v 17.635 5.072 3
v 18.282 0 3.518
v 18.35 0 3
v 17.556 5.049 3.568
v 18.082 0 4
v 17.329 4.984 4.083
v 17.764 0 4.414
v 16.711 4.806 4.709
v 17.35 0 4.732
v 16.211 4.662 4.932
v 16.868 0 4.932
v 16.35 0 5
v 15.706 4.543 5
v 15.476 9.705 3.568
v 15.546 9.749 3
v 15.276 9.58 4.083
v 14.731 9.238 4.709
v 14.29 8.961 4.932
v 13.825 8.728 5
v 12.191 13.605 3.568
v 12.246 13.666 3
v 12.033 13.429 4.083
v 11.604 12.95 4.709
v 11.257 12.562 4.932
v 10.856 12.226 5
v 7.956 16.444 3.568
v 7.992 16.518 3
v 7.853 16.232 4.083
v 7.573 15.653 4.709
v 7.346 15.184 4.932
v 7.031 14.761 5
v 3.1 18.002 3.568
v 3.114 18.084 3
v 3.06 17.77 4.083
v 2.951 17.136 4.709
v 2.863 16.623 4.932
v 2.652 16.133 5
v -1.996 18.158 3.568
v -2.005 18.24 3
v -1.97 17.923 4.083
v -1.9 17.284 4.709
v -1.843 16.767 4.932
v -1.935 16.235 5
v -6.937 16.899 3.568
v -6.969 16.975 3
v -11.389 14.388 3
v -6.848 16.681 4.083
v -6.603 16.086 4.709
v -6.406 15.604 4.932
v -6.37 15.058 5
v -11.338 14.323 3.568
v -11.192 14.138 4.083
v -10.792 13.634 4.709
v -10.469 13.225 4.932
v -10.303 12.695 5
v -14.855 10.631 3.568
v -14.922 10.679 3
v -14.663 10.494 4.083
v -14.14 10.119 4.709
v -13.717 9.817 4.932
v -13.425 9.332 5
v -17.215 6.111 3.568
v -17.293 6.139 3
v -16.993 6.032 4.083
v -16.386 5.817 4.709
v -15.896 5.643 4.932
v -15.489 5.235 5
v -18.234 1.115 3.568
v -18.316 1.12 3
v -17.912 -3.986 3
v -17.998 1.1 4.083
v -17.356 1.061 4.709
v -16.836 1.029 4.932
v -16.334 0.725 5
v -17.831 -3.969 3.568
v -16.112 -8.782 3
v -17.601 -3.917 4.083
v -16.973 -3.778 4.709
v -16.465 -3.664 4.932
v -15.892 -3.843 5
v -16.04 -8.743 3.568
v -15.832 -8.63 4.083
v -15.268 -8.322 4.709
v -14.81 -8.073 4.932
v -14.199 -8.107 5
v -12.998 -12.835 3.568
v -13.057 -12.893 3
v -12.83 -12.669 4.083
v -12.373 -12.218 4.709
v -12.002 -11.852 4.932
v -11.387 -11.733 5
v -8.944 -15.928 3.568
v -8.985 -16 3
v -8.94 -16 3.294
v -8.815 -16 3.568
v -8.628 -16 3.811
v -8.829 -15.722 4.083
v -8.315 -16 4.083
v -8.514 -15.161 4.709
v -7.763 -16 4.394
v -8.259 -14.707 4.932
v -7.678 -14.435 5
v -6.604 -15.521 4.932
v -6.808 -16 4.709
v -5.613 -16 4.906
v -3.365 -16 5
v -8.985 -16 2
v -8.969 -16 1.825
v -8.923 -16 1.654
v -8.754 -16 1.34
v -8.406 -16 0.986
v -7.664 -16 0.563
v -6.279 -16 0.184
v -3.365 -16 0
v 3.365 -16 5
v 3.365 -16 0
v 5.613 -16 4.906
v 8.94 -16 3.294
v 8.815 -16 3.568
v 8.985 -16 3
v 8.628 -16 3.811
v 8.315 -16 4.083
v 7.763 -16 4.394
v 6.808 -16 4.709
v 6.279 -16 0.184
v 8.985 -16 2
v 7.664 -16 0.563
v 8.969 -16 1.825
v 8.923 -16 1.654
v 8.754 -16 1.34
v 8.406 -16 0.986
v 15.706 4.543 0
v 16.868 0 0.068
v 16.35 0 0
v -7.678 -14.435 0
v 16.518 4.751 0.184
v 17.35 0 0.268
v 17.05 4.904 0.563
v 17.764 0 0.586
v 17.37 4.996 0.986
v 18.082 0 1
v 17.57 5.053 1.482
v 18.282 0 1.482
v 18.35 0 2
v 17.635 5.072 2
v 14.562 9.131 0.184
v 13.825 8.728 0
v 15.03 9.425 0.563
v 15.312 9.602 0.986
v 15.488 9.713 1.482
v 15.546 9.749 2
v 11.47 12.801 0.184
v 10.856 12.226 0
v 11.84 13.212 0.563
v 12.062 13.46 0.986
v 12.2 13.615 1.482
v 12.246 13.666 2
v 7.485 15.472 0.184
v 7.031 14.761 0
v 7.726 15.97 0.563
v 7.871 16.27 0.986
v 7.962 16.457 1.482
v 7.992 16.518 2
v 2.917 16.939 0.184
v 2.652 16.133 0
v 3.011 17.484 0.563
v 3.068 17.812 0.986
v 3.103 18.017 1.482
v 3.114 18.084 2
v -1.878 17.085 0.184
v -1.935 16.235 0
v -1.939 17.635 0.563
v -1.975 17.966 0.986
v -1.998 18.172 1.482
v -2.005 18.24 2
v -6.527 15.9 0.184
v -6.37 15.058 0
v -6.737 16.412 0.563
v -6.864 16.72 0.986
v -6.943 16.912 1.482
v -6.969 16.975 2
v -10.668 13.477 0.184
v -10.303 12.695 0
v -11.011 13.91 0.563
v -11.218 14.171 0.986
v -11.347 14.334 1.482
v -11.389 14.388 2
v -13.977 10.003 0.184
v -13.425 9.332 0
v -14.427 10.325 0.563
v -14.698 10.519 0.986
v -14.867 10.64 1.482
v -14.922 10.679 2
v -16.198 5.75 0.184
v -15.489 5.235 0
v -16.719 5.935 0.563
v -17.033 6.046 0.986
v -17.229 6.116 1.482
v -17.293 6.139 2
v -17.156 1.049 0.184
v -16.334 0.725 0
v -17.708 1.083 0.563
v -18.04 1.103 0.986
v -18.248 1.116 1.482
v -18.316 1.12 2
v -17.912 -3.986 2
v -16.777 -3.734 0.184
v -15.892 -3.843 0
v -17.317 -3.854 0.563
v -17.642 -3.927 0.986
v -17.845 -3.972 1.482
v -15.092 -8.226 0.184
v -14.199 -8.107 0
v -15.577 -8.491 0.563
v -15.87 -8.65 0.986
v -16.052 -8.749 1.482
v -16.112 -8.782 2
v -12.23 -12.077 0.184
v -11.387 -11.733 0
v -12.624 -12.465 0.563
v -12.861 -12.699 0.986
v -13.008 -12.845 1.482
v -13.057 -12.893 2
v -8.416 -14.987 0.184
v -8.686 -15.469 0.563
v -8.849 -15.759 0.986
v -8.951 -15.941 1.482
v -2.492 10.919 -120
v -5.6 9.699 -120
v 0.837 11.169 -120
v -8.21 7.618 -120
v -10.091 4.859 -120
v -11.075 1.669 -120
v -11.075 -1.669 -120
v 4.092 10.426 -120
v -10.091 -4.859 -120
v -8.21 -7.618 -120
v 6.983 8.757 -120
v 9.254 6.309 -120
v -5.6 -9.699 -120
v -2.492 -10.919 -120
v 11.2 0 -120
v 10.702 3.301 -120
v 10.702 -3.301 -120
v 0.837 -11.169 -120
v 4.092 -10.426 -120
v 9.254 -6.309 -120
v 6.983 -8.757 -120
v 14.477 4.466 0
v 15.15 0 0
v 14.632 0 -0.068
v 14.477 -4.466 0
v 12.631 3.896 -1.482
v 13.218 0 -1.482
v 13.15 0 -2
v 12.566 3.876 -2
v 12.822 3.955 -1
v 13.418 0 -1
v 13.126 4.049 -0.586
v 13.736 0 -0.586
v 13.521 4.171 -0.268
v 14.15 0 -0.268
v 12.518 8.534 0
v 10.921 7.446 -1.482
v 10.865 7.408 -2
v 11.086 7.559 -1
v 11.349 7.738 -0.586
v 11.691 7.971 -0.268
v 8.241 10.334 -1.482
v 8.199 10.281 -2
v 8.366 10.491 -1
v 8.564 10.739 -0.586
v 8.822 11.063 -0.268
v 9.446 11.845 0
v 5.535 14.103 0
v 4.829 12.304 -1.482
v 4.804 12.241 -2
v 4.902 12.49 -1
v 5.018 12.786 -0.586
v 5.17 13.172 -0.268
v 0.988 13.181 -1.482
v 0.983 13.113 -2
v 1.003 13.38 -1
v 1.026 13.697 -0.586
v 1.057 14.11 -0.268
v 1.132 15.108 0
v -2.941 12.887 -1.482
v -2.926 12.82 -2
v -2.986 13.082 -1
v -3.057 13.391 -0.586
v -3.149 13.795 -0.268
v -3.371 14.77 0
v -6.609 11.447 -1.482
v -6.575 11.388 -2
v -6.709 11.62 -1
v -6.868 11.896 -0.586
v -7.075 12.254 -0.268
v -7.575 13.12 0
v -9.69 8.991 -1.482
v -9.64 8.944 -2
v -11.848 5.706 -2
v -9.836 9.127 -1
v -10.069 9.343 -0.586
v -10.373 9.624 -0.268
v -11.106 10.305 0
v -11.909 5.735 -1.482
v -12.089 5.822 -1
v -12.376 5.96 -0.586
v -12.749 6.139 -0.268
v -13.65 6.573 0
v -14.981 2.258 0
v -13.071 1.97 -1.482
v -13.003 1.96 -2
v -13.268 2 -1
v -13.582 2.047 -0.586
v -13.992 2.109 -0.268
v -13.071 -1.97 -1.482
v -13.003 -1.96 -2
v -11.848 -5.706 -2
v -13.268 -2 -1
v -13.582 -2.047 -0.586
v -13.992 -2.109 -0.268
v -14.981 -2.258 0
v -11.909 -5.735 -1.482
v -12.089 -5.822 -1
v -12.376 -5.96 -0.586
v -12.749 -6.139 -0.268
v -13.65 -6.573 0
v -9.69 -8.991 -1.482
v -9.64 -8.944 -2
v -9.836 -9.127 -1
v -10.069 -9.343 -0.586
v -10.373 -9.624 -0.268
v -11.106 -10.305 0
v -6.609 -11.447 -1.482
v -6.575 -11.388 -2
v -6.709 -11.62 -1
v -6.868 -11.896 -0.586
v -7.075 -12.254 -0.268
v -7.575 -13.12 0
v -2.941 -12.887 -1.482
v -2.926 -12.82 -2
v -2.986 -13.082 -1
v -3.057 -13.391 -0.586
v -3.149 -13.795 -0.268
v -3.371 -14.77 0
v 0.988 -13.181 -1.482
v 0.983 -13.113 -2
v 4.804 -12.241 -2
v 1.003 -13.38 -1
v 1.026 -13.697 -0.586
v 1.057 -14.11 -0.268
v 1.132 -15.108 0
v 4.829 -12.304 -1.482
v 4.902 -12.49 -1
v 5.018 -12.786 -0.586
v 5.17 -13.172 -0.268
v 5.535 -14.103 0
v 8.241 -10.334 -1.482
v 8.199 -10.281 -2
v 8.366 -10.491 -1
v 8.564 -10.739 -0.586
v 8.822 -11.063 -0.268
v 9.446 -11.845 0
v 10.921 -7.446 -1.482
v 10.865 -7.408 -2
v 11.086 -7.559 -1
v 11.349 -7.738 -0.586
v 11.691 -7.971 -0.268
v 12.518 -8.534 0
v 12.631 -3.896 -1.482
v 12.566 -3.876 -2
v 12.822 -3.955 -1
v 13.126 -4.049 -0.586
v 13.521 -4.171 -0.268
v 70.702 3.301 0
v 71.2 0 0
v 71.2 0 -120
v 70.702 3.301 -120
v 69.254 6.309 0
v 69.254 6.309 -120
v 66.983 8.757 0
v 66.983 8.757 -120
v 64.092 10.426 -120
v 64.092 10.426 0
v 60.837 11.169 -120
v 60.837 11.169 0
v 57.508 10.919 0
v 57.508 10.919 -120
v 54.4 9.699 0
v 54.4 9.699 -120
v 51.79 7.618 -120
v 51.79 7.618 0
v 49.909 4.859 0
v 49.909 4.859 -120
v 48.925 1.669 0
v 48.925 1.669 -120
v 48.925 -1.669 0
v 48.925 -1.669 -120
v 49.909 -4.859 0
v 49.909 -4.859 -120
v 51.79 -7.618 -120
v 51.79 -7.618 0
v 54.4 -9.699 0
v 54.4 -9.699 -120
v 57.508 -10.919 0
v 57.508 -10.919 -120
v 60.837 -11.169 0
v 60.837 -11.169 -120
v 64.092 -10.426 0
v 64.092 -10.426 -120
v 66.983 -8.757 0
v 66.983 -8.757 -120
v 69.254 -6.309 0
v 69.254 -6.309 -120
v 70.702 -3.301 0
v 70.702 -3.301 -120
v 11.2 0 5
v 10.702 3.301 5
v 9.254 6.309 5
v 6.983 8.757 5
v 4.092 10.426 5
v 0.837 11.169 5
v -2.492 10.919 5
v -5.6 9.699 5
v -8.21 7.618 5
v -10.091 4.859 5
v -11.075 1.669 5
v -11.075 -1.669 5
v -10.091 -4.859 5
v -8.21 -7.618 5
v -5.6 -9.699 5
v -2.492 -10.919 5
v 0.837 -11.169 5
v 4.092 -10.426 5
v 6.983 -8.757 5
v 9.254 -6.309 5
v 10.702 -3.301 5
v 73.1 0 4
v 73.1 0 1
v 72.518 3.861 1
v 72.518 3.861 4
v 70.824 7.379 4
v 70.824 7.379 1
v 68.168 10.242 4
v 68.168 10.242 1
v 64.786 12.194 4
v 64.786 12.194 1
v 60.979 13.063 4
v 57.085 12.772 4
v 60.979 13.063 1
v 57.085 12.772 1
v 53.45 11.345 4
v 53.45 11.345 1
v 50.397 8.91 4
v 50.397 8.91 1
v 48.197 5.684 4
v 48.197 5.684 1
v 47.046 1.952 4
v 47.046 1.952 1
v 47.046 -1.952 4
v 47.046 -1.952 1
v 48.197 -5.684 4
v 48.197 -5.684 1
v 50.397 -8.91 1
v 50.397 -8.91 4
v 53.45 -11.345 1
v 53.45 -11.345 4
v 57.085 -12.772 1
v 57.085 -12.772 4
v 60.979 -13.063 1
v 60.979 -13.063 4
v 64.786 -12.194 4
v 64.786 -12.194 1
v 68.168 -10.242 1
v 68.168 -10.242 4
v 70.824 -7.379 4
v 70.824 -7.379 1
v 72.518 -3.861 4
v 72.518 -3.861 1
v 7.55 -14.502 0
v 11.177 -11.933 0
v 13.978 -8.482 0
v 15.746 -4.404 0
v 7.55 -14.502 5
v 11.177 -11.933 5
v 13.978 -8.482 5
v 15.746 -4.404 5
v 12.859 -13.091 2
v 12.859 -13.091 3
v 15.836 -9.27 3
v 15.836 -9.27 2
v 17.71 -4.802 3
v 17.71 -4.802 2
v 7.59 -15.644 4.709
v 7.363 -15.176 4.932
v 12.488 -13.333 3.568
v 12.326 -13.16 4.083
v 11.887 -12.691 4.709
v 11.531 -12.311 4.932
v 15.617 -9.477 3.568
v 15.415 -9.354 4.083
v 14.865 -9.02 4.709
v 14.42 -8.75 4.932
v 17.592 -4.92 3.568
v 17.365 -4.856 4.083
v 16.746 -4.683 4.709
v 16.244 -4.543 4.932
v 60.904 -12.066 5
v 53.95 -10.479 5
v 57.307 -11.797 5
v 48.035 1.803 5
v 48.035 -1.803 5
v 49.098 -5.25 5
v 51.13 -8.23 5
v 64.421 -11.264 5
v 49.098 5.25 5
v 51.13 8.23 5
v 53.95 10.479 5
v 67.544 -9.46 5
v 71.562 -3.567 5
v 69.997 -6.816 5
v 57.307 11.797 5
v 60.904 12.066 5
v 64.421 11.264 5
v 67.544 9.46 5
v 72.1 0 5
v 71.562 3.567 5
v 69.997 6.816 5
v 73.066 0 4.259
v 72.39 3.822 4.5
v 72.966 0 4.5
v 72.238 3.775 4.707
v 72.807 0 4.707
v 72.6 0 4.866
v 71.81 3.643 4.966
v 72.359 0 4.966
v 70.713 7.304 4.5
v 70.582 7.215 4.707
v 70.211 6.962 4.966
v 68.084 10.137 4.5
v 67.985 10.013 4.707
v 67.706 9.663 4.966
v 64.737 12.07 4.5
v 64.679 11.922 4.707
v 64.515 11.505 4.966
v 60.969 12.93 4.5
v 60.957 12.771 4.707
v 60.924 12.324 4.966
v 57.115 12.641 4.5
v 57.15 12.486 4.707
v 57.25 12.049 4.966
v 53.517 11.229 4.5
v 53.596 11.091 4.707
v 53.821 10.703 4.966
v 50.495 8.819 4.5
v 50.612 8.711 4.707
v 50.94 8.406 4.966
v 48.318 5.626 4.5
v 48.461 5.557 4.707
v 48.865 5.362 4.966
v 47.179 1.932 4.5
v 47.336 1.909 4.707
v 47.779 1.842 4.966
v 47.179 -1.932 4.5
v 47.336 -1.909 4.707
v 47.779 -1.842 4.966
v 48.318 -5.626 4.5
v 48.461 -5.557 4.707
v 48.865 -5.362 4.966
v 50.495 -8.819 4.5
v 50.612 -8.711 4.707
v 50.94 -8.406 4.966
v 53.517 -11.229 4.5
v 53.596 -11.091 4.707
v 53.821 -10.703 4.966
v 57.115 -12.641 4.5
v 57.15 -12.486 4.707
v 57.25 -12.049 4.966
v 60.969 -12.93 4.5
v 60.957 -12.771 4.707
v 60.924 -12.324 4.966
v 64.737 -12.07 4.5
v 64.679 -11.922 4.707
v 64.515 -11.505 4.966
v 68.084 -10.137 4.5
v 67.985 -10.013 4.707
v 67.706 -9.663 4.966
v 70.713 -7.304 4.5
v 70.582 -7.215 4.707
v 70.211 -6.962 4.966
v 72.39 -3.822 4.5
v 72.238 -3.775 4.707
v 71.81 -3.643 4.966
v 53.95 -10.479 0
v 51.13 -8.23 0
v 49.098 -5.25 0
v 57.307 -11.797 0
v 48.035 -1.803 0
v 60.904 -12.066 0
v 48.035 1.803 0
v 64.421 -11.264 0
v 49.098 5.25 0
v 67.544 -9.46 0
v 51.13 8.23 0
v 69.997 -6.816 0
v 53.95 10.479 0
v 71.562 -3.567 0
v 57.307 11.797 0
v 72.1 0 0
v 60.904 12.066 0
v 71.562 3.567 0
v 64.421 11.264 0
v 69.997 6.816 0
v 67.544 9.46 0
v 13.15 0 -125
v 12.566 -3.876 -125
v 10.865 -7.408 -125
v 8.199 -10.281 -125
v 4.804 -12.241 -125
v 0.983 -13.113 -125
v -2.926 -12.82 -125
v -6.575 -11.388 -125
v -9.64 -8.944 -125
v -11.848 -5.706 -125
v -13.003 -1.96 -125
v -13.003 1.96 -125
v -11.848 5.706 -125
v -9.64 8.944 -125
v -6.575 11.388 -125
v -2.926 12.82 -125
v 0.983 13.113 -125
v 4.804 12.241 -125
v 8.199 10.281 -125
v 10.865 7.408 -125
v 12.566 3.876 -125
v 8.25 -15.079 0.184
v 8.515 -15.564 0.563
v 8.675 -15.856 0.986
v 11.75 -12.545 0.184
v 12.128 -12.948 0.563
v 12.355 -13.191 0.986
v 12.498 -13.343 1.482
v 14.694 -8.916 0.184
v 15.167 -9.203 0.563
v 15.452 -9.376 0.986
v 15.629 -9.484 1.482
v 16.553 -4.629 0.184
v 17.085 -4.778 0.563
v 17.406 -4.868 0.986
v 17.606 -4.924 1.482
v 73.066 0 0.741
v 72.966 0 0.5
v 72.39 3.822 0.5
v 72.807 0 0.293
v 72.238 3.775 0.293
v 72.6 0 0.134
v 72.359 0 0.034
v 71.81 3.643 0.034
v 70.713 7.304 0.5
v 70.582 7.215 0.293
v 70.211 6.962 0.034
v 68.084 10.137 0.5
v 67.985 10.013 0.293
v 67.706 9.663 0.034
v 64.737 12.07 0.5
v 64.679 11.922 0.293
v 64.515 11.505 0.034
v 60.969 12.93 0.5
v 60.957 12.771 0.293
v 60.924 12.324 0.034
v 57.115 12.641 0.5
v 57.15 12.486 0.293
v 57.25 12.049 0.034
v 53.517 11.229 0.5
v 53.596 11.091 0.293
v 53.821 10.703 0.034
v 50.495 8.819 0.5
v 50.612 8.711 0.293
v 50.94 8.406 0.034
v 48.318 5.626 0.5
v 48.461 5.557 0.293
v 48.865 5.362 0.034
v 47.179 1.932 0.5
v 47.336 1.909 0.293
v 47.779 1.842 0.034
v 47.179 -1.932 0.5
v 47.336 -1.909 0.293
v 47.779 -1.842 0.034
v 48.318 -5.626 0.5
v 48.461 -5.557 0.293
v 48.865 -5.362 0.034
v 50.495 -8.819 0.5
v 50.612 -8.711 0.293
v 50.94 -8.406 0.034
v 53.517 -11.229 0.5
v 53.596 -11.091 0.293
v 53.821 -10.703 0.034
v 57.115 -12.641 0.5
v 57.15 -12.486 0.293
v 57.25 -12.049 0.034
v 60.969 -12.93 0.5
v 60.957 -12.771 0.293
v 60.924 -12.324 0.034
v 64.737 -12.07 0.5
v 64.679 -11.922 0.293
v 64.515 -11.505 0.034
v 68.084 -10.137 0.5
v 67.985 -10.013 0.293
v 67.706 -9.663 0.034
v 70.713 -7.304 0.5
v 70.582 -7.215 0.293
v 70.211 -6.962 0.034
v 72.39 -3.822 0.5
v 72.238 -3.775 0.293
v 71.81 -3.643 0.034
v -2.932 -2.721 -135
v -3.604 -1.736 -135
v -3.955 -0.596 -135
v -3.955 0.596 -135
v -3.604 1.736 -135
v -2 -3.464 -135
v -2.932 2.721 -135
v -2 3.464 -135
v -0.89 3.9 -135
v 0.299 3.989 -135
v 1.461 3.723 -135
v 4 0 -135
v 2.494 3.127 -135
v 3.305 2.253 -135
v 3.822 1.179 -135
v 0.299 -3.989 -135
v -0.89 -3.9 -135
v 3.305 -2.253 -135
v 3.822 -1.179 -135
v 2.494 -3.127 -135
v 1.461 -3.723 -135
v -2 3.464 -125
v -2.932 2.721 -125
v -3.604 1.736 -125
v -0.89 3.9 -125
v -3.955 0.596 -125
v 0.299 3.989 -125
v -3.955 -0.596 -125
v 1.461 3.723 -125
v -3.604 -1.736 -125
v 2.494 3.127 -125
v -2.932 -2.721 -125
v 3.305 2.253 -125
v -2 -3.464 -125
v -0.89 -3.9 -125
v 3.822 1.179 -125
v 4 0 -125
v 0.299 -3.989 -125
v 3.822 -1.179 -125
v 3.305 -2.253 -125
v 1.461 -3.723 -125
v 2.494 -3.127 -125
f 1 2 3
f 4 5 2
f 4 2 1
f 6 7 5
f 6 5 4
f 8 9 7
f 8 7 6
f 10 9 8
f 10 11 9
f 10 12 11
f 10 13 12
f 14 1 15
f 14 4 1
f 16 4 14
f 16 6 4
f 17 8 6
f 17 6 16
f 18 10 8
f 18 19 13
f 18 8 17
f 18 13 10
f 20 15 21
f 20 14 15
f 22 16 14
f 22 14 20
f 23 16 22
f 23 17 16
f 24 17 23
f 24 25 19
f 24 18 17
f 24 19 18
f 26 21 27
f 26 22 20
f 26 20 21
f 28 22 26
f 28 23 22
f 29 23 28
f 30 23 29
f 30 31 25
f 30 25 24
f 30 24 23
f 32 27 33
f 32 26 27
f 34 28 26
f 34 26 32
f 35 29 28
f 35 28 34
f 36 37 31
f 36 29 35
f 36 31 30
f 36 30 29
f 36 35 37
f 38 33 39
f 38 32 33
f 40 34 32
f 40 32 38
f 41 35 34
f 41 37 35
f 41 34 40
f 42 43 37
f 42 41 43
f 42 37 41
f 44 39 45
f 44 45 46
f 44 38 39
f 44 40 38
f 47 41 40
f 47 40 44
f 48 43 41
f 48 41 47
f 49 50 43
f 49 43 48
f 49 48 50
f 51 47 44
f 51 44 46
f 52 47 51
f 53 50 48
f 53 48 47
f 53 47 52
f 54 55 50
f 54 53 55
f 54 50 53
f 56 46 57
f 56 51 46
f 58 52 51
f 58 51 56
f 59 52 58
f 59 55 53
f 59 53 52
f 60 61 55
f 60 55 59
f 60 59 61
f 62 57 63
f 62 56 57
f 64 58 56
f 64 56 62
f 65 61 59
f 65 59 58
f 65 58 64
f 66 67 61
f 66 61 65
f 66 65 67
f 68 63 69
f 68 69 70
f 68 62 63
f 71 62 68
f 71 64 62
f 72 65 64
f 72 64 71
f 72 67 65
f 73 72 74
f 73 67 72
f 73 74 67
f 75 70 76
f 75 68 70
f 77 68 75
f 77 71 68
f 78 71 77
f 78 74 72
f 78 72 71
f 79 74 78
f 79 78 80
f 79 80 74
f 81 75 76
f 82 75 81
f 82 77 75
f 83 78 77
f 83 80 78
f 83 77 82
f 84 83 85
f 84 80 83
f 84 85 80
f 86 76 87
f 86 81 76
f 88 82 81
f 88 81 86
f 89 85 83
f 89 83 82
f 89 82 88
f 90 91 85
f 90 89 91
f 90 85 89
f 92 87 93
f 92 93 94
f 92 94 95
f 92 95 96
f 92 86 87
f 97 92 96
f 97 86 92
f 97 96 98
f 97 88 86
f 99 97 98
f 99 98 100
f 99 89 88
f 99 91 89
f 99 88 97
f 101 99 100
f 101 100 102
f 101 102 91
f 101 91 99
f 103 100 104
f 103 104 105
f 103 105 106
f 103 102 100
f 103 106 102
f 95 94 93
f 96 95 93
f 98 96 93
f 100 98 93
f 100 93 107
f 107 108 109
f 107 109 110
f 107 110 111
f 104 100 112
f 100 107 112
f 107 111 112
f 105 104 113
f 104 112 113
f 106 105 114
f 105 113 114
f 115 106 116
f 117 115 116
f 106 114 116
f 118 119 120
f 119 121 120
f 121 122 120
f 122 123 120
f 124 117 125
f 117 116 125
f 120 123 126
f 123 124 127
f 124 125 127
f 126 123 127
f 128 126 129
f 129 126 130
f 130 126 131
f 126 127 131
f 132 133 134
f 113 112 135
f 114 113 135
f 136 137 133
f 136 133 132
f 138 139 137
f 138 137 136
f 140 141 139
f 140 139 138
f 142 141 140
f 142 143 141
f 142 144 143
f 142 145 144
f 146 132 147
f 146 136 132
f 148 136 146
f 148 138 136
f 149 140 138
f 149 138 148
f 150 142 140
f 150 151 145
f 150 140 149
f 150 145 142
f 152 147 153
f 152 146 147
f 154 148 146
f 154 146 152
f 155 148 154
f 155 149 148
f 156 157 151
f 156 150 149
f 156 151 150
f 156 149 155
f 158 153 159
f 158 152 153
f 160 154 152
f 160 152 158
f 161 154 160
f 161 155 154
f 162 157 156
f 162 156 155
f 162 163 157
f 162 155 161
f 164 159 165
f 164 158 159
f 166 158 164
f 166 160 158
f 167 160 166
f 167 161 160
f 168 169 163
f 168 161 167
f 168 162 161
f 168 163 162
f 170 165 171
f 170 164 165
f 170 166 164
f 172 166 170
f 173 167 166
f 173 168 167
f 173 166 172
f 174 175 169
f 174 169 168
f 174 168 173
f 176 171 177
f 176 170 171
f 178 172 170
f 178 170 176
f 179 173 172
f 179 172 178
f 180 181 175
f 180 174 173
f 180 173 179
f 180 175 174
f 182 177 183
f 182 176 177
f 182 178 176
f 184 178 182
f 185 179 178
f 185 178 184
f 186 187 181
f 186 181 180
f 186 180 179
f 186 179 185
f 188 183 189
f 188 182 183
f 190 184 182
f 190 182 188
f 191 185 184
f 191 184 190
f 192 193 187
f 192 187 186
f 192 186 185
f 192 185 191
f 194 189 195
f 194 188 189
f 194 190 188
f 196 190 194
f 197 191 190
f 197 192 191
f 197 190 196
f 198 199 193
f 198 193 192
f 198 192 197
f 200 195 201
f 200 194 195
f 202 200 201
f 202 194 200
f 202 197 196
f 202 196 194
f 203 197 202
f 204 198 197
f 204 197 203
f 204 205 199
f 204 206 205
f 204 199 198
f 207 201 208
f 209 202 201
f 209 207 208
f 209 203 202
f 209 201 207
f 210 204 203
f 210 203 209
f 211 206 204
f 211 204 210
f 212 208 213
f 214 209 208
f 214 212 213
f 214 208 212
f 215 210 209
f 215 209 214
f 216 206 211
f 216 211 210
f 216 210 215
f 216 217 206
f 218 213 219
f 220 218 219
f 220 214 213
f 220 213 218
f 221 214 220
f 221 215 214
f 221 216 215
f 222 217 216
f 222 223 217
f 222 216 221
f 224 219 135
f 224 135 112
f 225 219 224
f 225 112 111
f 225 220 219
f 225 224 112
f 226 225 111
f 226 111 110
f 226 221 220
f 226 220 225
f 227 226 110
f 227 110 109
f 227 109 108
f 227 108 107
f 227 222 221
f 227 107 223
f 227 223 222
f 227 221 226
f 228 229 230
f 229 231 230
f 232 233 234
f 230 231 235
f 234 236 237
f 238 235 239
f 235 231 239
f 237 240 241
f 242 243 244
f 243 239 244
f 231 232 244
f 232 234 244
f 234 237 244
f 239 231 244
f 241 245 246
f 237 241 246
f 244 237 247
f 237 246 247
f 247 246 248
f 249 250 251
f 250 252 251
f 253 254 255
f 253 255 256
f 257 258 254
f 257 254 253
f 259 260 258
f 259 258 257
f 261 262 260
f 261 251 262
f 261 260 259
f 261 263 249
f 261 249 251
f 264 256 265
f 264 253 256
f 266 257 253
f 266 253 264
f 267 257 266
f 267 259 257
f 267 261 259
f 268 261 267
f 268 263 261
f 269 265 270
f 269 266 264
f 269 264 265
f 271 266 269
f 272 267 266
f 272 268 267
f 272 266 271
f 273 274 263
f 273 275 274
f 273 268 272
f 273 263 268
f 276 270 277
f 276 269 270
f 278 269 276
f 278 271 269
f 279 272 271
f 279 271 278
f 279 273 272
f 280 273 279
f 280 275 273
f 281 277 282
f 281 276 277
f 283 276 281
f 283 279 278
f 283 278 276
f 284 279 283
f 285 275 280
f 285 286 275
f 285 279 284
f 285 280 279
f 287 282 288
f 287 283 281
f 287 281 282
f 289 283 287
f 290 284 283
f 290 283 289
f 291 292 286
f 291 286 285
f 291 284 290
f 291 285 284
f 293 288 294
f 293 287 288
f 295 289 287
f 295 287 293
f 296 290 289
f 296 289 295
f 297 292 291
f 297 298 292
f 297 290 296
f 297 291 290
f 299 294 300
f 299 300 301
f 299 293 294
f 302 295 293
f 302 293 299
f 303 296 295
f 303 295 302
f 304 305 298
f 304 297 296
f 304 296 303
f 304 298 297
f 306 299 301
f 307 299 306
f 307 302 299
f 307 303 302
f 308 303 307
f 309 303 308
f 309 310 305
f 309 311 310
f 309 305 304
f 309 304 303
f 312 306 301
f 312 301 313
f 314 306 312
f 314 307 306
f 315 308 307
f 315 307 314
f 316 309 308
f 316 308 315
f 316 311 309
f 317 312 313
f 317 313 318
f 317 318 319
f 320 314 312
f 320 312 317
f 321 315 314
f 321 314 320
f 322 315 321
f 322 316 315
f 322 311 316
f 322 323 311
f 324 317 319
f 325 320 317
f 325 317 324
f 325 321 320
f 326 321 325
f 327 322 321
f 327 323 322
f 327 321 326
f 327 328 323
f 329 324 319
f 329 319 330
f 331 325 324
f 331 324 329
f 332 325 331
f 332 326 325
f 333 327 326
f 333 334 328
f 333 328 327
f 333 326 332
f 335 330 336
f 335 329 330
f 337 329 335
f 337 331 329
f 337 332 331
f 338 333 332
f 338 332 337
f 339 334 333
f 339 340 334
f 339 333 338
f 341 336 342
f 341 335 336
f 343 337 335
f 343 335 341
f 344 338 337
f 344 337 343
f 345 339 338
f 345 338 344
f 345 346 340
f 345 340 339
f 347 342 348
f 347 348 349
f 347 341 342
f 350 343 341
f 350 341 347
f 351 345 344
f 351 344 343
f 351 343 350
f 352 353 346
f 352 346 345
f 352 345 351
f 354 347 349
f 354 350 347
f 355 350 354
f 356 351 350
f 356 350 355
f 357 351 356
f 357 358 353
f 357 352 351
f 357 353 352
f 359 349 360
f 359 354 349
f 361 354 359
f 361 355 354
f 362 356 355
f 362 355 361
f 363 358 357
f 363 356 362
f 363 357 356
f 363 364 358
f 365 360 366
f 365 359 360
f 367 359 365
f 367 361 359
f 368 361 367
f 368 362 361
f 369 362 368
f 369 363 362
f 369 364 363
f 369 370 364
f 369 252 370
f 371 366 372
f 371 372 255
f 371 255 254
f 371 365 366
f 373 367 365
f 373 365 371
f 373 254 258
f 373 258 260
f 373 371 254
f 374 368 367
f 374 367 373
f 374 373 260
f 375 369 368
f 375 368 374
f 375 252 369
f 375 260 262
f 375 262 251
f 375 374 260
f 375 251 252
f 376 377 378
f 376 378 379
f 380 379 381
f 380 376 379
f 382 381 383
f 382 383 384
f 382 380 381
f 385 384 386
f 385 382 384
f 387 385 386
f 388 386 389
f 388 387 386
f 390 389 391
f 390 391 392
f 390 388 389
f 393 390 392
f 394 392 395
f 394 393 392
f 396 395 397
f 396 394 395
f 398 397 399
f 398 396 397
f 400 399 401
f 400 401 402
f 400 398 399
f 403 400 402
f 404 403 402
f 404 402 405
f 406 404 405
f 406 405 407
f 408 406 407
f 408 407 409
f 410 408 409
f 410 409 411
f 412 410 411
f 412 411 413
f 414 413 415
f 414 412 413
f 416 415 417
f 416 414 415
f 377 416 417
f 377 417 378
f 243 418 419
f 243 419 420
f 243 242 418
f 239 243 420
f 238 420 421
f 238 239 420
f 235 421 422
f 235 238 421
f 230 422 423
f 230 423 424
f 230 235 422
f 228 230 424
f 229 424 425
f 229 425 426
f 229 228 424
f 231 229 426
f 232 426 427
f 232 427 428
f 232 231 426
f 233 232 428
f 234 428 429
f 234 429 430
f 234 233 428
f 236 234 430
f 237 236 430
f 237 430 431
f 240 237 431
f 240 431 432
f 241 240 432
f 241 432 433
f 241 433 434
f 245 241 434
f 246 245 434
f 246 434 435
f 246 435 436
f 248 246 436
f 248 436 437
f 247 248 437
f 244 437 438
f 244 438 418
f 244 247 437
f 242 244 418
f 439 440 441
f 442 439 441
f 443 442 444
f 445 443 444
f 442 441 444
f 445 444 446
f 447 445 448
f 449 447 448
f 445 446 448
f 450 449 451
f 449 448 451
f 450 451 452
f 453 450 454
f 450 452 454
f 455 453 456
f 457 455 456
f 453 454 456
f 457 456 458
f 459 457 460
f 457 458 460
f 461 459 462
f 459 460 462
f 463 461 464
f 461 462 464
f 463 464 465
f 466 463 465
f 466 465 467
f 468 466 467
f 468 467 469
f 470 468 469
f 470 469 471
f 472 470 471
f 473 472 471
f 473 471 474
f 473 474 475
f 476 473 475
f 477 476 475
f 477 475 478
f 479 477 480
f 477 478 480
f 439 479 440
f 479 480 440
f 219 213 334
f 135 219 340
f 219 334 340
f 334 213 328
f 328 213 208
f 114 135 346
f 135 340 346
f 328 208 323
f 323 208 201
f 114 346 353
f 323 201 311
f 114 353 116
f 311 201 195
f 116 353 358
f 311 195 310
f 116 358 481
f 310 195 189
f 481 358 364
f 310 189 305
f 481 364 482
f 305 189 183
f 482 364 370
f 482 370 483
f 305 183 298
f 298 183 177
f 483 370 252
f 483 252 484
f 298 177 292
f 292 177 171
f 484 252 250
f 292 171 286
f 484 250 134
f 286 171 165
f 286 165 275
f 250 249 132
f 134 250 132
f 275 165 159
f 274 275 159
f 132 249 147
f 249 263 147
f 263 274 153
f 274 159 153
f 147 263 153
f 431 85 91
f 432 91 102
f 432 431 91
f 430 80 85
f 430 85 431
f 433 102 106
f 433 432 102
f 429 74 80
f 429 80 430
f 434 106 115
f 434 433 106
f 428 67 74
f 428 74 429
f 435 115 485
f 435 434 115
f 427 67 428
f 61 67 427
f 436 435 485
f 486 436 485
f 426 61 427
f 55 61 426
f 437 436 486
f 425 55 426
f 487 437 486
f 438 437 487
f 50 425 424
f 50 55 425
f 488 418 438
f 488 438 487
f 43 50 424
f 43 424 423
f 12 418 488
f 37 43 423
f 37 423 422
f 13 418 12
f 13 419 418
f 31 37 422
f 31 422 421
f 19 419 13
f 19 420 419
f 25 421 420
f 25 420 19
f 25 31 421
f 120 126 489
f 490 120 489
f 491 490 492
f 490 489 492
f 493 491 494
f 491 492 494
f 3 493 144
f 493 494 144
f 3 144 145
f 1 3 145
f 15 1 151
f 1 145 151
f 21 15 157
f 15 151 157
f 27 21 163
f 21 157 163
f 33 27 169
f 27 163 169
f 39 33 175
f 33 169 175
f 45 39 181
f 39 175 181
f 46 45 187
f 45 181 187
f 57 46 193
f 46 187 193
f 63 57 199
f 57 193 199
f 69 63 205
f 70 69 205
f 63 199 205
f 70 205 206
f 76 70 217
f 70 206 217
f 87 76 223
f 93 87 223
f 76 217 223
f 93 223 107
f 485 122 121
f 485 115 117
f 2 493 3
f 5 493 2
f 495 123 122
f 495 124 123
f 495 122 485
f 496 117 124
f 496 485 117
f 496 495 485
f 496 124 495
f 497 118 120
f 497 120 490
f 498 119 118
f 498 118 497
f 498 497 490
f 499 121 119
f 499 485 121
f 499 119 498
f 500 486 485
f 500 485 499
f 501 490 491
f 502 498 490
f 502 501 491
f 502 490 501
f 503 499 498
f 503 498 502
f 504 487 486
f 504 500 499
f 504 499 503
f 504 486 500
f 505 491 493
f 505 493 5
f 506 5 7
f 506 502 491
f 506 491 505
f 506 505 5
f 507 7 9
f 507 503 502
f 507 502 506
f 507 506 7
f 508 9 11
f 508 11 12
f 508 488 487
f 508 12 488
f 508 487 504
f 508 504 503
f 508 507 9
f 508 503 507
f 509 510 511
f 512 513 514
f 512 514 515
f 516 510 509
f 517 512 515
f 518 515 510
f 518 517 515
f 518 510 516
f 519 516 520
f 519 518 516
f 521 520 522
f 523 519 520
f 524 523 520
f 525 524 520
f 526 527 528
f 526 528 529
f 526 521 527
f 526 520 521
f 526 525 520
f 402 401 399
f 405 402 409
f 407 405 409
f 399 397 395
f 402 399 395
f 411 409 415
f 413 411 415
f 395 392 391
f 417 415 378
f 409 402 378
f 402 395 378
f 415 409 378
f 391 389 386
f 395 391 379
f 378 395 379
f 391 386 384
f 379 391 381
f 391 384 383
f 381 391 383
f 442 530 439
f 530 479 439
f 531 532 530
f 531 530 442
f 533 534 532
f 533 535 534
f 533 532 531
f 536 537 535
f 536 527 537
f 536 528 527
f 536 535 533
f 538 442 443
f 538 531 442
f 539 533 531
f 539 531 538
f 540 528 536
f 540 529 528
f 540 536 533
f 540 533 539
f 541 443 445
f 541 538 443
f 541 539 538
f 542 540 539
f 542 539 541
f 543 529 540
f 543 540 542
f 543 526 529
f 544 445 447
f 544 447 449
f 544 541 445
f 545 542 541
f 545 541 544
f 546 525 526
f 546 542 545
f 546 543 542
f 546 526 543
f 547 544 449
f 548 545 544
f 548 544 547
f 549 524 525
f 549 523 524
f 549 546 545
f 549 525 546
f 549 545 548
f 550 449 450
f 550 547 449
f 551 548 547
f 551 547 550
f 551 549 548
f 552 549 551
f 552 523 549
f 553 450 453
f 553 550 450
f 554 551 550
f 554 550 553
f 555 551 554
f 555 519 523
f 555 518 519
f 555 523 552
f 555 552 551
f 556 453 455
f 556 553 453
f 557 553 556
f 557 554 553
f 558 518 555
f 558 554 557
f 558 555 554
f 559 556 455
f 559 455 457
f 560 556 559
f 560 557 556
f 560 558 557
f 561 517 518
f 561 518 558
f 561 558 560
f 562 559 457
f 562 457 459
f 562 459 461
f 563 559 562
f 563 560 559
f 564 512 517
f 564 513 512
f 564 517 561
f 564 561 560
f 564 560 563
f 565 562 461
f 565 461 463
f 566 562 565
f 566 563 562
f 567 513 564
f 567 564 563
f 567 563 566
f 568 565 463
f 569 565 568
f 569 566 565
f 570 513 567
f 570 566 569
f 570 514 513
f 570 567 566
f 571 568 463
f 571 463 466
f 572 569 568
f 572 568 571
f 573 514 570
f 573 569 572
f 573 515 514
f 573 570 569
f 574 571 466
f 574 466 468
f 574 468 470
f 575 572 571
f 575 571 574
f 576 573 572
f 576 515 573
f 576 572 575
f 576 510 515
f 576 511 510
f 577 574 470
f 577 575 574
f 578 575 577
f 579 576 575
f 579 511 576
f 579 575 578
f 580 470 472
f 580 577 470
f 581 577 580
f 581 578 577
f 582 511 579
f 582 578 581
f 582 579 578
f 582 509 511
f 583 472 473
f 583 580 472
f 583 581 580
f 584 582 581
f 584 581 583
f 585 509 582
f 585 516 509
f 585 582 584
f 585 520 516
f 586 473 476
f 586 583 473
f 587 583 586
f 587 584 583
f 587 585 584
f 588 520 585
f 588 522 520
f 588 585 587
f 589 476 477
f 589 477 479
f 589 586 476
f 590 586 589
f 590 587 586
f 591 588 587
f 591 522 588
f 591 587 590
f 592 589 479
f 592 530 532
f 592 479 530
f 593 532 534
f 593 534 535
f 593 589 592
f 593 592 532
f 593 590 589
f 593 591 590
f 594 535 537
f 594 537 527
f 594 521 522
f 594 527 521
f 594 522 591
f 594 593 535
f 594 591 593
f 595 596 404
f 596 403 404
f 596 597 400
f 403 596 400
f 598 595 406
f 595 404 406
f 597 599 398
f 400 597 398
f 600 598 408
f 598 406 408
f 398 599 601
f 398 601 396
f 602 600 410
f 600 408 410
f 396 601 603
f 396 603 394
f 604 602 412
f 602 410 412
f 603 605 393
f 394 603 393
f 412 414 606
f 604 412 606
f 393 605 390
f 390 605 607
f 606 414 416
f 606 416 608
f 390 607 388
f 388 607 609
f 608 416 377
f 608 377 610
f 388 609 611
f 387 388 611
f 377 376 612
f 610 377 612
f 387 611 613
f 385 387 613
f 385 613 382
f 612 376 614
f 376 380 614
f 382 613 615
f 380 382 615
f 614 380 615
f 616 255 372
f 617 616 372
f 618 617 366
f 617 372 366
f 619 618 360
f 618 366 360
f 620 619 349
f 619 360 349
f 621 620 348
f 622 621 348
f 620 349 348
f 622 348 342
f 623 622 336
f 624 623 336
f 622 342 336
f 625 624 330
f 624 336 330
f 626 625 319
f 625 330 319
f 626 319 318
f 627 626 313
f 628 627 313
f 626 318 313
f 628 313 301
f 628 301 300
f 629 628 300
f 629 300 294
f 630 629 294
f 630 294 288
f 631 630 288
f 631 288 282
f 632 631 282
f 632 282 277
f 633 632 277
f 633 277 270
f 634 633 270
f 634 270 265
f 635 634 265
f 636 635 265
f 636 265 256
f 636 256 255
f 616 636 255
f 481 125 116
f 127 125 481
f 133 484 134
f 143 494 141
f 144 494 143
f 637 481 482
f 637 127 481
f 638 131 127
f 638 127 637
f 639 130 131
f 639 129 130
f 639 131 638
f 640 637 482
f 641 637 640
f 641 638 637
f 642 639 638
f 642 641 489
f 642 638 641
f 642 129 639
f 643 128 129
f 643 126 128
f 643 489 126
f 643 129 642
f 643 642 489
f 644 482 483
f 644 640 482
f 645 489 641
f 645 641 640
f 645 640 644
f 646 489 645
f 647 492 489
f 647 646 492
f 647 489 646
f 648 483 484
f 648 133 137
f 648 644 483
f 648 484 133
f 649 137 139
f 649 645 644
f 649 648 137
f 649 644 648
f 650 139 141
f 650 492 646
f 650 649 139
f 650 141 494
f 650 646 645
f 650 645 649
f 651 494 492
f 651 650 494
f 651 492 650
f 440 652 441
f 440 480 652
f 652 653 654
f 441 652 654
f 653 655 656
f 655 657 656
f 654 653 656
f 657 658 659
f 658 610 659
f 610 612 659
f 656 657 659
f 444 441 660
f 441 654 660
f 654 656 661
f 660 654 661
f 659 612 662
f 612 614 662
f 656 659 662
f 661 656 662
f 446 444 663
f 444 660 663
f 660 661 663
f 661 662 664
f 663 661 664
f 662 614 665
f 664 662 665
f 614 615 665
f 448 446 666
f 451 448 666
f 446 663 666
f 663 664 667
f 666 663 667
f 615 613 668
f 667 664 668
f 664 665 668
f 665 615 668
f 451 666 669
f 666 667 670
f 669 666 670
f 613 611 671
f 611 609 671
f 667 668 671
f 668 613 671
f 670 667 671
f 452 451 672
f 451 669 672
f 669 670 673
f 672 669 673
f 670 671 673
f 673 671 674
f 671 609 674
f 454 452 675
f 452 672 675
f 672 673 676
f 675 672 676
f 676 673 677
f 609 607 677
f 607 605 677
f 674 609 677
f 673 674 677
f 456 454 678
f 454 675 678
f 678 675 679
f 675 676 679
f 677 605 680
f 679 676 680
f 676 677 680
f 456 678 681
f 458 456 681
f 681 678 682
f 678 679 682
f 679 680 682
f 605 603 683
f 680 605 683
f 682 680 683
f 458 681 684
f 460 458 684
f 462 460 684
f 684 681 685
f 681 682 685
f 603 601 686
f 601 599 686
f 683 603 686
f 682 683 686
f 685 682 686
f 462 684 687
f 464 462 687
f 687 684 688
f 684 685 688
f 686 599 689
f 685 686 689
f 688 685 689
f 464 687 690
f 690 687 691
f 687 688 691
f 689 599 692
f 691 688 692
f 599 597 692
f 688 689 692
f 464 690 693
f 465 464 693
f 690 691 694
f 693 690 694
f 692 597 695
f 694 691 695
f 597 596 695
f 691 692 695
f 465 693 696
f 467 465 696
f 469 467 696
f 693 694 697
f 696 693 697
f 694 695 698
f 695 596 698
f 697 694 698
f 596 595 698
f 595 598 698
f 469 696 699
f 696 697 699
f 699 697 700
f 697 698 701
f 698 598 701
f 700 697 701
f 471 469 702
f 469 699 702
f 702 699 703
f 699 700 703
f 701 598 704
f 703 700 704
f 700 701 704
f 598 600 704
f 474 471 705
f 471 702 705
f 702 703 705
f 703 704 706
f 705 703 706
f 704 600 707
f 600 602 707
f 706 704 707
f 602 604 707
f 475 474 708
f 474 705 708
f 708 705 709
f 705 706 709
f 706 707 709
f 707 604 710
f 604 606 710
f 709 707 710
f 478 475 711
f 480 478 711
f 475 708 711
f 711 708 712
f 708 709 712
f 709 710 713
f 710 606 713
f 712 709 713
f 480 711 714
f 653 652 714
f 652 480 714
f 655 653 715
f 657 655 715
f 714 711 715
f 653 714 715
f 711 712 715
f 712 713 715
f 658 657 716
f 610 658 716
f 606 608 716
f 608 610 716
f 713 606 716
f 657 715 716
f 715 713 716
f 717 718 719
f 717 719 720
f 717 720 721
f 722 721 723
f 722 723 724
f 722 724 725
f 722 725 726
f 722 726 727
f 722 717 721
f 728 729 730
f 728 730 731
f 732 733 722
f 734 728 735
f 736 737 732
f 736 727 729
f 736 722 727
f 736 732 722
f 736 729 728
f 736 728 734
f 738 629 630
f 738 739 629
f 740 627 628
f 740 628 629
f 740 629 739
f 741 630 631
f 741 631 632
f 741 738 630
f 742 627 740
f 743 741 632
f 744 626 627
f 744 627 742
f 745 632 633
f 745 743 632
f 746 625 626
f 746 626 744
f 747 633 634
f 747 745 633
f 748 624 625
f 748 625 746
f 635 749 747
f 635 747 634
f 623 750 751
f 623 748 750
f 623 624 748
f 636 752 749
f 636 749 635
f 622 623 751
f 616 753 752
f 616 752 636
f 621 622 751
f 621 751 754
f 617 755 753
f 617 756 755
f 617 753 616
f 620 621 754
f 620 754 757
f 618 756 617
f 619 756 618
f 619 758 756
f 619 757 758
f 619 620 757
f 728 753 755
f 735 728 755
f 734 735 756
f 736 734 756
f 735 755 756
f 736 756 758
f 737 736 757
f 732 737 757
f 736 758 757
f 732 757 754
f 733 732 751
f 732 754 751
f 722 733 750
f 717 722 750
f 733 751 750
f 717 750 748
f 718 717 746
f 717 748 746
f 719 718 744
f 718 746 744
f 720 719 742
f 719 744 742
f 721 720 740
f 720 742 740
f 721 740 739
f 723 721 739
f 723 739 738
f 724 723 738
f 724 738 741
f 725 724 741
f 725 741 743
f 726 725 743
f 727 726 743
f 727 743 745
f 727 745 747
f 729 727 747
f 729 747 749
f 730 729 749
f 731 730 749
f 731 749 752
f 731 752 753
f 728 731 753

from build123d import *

# Parameters (mm, degrees)
F0_R     = 13.15
F0_R_2   = 11.2
F1_DEPTH = 5
F2_DEPTH = 120
F3_R     = 13.15
F3_R_2   = 11.2
F3_R_3   = 4
F4_DEPTH = 5
F5_DEPTH = 15
F6_R     = 2
F7_R     = 13.1
F7_R_2   = 11.2
F8_DEPTH = 5
F9_DEPTH = 120
F10_R    = 1


with BuildPart() as f1:
    # F0 (on Top) → F1 (new body)
    with BuildSketch(Plane.XY):
        with BuildLine():
            ThreePointArc((8.9845701066, -16), (15.8364983733, -9.2697259545), (18.35, 0))
            ThreePointArc((18.35, 0), (-9.2697259545, 15.8364983733), (-8.9845701066, -16))
            Line((-8.9845701066, -16), (8.9845701066, -16))
        make_face()
        Circle(F0_R, mode=Mode.SUBTRACT)
        Circle(F0_R)
        Circle(F0_R_2, mode=Mode.SUBTRACT)
    extrude(amount=F1_DEPTH)

    # F0 (on Top) → F2 (join)
    with BuildSketch(Plane.XY):
        Circle(F0_R)
        Circle(F0_R_2, mode=Mode.SUBTRACT)
    extrude(amount=-F2_DEPTH)

    # F3 (on face) → F4 (join)
    with BuildSketch(Plane(origin=(0, 0, -120), x_dir=(1, 0, 0), z_dir=(0, 0, -1))):
        Circle(F3_R)
        Circle(F3_R_2, mode=Mode.SUBTRACT)
        Circle(F3_R_2)
        Circle(F3_R_3, mode=Mode.SUBTRACT)
    extrude(amount=F4_DEPTH)

    # F3 (on face) → F5 (join)
    with BuildSketch(Plane(origin=(0, 0, -120), x_dir=(1, 0, 0), z_dir=(0, 0, -1))):
        Circle(F3_R_3)
    extrude(amount=F5_DEPTH)

    # F6
    f6_edges = [f1.edges().sort_by_distance(p)[0] for p in [
        (0, 18.35, 5),
        (0, 18.35, 0),
        (-13.15, 0, 0),
    ]]
    fillet(f6_edges, radius=F6_R)


with BuildPart() as f8:
    # F7 (on Top) → F8 (new body)
    with BuildSketch(Plane.XY):
        with Locations((60, 0)):
            Circle(F7_R)
        with Locations((60, 0)):
            Circle(F7_R_2, mode=Mode.SUBTRACT)
        with Locations((60, 0)):
            Circle(F7_R_2)
    extrude(amount=F8_DEPTH)

    # F7 (on Top) → F9 (join)
    with BuildSketch(Plane.XY):
        with Locations((60, 0)):
            Circle(F7_R_2)
    extrude(amount=-F9_DEPTH)

    # F10
    f10_edges = [f8.edges().sort_by_distance(p)[0] for p in [
        (46.9, 0, 5),
        (46.9, 0, 0),
    ]]
    fillet(f10_edges, radius=F10_R)


solid = Compound([f1.part, f8.part])
